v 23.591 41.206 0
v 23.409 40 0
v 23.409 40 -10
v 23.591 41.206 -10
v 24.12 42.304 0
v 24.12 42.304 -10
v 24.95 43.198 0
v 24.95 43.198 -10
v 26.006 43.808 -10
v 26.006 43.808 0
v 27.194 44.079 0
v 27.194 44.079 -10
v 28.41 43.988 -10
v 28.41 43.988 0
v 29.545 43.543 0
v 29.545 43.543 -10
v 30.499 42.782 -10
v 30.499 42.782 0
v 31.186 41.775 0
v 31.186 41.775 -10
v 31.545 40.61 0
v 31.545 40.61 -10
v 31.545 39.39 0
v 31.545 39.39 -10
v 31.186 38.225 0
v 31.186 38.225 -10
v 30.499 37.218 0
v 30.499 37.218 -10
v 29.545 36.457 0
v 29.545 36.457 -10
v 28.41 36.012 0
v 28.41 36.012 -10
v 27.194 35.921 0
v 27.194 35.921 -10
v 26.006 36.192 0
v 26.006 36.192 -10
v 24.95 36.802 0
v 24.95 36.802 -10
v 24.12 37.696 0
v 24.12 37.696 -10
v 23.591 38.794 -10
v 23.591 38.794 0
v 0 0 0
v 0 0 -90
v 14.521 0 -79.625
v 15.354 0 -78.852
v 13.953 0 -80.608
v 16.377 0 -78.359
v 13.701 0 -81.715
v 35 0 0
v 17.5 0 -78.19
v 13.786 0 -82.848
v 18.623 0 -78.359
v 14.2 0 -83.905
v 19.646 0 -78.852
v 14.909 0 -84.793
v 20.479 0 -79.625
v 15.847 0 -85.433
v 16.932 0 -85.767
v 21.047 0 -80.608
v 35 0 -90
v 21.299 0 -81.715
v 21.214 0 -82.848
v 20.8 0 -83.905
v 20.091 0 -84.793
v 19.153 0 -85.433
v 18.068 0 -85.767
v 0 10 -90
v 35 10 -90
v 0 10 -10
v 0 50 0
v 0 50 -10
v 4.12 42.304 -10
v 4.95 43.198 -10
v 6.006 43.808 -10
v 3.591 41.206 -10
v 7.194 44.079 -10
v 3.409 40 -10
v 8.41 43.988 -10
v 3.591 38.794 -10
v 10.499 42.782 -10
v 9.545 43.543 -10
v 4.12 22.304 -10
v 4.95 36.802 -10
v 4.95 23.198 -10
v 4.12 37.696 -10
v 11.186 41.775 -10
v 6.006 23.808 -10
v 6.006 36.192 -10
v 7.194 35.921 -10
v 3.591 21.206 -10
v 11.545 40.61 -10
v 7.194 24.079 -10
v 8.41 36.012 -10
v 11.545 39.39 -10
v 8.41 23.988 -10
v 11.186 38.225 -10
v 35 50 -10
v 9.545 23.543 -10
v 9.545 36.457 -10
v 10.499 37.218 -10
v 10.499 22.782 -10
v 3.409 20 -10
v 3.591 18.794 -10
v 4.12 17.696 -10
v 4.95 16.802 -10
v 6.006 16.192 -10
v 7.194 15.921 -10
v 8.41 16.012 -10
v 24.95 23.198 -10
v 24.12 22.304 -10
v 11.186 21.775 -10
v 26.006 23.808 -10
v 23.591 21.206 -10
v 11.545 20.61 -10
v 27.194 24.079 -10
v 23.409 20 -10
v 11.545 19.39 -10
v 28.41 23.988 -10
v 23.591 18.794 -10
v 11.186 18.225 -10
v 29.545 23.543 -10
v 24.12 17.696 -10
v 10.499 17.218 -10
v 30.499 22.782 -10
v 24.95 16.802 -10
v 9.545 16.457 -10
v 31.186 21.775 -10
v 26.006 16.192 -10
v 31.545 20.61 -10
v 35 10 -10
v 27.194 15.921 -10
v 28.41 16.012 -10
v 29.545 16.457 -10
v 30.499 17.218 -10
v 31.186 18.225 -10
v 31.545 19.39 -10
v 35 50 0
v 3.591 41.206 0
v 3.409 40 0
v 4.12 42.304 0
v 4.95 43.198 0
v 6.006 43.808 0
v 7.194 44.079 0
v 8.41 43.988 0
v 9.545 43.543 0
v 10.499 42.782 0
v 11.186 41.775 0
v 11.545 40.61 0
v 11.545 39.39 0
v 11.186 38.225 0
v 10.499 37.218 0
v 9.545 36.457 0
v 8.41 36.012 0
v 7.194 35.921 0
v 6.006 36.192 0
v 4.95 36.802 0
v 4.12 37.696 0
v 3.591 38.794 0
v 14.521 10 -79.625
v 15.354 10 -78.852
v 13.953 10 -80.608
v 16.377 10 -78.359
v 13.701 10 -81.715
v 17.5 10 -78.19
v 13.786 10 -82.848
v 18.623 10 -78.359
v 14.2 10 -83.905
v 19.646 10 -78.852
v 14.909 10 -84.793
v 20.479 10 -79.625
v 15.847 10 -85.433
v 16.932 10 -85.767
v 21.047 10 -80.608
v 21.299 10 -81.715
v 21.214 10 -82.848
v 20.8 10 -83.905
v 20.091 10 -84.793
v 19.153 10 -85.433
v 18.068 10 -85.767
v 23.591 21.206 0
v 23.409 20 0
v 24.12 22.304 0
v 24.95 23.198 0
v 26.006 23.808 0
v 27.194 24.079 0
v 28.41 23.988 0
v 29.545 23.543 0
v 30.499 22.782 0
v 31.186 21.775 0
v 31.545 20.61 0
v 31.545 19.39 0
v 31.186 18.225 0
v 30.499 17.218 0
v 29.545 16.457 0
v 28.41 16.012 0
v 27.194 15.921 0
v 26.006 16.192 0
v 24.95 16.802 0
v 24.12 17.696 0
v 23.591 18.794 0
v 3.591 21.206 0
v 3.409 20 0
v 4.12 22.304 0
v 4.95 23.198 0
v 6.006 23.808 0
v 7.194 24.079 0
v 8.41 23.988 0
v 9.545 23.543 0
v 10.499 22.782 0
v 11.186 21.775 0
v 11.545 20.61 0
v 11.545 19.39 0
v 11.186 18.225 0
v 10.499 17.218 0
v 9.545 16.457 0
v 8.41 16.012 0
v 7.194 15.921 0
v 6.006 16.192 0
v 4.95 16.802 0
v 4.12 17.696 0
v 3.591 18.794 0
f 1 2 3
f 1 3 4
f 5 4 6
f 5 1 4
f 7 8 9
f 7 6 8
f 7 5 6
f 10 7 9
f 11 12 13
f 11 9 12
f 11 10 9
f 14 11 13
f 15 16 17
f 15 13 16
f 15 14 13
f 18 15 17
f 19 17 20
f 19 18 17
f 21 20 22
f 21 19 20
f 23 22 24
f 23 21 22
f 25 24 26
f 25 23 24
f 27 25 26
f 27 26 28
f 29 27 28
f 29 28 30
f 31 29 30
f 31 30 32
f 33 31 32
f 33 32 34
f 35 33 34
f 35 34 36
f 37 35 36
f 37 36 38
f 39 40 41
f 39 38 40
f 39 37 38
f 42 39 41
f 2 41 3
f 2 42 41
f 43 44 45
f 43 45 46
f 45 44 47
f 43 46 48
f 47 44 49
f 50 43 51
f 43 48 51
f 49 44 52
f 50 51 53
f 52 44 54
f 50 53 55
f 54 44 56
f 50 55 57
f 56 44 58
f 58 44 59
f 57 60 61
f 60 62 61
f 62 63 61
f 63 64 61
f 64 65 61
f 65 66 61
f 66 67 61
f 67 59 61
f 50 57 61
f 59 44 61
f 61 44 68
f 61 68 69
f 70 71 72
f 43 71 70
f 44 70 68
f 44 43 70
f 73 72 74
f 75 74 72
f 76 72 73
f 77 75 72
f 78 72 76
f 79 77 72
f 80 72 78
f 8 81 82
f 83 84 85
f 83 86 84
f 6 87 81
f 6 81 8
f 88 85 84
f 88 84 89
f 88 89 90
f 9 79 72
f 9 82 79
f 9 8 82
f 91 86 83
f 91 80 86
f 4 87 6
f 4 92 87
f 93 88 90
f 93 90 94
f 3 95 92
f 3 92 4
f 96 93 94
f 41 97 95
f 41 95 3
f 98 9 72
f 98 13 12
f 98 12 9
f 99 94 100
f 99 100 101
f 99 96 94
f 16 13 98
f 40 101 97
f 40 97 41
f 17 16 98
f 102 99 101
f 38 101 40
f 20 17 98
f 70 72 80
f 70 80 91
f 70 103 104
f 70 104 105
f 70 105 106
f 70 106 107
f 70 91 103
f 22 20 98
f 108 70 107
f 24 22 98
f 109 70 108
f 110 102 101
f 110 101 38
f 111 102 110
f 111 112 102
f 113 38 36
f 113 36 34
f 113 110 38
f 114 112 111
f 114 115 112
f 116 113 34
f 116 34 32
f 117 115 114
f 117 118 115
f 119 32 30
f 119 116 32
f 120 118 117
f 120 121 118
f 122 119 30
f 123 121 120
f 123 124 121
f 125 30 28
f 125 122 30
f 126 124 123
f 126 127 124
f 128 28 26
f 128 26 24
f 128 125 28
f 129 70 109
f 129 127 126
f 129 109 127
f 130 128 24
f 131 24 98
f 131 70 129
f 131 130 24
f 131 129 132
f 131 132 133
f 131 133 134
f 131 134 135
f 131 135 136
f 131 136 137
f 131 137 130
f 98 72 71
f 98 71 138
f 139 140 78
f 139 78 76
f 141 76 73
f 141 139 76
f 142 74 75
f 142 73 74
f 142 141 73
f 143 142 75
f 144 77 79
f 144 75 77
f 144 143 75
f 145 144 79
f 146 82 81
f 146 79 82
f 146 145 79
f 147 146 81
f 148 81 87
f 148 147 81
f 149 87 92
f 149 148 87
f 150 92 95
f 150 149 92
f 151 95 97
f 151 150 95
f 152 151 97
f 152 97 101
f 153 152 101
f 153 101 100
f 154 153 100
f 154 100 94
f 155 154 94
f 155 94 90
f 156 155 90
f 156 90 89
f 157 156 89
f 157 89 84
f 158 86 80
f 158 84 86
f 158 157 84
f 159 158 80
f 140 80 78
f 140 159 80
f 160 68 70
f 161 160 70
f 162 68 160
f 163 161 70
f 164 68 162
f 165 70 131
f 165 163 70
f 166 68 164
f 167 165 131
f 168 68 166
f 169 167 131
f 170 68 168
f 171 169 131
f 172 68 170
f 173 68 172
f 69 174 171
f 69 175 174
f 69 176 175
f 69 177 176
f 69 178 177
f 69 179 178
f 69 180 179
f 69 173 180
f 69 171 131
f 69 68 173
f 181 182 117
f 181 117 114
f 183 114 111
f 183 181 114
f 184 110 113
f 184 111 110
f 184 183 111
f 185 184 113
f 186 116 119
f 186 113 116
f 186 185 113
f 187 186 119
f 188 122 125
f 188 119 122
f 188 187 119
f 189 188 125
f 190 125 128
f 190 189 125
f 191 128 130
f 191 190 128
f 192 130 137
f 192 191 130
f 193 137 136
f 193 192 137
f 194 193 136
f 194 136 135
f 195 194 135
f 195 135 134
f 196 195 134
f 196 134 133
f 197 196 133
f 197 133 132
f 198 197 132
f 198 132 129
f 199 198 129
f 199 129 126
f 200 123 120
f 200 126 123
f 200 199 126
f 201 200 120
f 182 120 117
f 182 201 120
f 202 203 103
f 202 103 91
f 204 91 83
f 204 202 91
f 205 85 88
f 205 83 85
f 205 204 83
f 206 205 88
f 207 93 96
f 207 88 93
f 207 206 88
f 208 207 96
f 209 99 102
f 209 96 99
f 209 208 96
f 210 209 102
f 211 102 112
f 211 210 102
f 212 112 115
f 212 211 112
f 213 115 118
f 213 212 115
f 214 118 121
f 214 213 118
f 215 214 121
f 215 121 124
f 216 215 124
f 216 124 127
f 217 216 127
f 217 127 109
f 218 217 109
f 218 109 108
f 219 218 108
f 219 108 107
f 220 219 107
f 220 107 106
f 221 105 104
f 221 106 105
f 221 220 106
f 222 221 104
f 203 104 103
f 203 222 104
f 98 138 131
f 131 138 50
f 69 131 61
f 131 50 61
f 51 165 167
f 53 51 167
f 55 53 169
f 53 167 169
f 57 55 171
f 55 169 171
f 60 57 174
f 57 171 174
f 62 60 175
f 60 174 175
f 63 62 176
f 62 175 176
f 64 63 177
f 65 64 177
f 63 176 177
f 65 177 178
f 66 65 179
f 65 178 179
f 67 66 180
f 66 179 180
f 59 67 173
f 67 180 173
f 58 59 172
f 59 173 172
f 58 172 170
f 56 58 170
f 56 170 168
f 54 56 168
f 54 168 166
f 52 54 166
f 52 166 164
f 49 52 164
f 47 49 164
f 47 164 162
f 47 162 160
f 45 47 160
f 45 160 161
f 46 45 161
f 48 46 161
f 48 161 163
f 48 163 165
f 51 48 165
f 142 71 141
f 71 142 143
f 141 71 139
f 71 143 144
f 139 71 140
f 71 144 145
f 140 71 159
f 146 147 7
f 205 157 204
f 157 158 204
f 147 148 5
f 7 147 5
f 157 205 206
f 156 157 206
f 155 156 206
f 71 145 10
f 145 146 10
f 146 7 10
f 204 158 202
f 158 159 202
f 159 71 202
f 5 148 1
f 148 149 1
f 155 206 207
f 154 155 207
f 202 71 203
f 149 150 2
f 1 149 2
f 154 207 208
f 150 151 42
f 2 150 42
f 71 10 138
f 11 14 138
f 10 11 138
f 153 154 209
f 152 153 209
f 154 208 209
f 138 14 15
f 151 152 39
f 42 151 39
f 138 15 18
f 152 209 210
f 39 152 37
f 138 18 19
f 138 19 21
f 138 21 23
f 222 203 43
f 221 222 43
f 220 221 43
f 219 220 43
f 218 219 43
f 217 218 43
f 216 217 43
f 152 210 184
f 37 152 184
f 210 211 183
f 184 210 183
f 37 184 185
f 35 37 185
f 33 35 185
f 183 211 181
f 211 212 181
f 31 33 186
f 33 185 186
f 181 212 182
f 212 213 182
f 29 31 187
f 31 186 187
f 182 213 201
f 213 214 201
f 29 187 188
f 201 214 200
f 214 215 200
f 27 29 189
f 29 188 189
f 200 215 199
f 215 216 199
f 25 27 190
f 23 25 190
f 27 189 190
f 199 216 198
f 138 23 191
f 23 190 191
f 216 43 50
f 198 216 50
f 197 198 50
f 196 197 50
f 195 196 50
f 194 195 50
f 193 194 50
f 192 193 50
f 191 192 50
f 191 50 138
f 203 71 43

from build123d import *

# Parameters (mm, degrees)
SKETCH1_W               = 35
SKETCH1_H               = 90
BOSS_EXTRUDE1_DEPTH     = 10
SKETCH2_W               = 35
SKETCH2_H               = 10
BOSS_EXTRUDE2_DEPTH     = 40
CUT_EXTRUDE1_DEPTH      = 101.623058987
CUT_EXTRUDE1_DEPTH_BACK = 101.623058987
SKETCH3_R               = 4.090684301
SKETCH4_R               = 3.81
CUT_EXTRUDE2_DEPTH      = 105.522724802


with BuildPart() as part:
    # Sketch1 → Boss-Extrude1 (new body)
    with BuildSketch(Plane(origin=(0, 0, 0), x_dir=(1, 0, 0), z_dir=(0, 1, 0))):
        with Locations((17.5, 45)):
            Rectangle(SKETCH1_W, SKETCH1_H)
    extrude(amount=BOSS_EXTRUDE1_DEPTH)

    # Sketch2 → Boss-Extrude2 (add)
    with BuildSketch(Plane(origin=(0, 10, 0), x_dir=(1, 0, 0), z_dir=(0, 1, 0))):
        with Locations((17.5, 5)):
            Rectangle(SKETCH2_W, SKETCH2_H)
    extrude(amount=BOSS_EXTRUDE2_DEPTH)

    # Sketch3 → Cut-Extrude1 (cut, two sides: drawn at the far end of the back side and taken through both)
    with BuildSketch(Plane(origin=(0, 0, -10), x_dir=(-1, 0, 0), z_dir=(0, 0, -1)).offset(-CUT_EXTRUDE1_DEPTH_BACK)):
        with Locations((-27.5, 40)):
            Circle(SKETCH3_R)
        with Locations((-7.5, 40)):
            Circle(SKETCH3_R)
        with Locations((-7.5, 20)):
            Circle(SKETCH3_R)
        with Locations((-27.5, 20)):
            Circle(SKETCH3_R)
    extrude(amount=CUT_EXTRUDE1_DEPTH + CUT_EXTRUDE1_DEPTH_BACK, mode=Mode.SUBTRACT)

    # Sketch4 → Cut-Extrude2 (cut, through all)
    with BuildSketch(Plane(origin=(0, 10, 0), x_dir=(1, 0, 0), z_dir=(0, 1, 0))):
        with Locations(Location((17.5, 82, 0), (0, 0, 270))):
            Circle(SKETCH4_R)
    extrude(amount=-CUT_EXTRUDE2_DEPTH, mode=Mode.SUBTRACT)


solid = part.part
